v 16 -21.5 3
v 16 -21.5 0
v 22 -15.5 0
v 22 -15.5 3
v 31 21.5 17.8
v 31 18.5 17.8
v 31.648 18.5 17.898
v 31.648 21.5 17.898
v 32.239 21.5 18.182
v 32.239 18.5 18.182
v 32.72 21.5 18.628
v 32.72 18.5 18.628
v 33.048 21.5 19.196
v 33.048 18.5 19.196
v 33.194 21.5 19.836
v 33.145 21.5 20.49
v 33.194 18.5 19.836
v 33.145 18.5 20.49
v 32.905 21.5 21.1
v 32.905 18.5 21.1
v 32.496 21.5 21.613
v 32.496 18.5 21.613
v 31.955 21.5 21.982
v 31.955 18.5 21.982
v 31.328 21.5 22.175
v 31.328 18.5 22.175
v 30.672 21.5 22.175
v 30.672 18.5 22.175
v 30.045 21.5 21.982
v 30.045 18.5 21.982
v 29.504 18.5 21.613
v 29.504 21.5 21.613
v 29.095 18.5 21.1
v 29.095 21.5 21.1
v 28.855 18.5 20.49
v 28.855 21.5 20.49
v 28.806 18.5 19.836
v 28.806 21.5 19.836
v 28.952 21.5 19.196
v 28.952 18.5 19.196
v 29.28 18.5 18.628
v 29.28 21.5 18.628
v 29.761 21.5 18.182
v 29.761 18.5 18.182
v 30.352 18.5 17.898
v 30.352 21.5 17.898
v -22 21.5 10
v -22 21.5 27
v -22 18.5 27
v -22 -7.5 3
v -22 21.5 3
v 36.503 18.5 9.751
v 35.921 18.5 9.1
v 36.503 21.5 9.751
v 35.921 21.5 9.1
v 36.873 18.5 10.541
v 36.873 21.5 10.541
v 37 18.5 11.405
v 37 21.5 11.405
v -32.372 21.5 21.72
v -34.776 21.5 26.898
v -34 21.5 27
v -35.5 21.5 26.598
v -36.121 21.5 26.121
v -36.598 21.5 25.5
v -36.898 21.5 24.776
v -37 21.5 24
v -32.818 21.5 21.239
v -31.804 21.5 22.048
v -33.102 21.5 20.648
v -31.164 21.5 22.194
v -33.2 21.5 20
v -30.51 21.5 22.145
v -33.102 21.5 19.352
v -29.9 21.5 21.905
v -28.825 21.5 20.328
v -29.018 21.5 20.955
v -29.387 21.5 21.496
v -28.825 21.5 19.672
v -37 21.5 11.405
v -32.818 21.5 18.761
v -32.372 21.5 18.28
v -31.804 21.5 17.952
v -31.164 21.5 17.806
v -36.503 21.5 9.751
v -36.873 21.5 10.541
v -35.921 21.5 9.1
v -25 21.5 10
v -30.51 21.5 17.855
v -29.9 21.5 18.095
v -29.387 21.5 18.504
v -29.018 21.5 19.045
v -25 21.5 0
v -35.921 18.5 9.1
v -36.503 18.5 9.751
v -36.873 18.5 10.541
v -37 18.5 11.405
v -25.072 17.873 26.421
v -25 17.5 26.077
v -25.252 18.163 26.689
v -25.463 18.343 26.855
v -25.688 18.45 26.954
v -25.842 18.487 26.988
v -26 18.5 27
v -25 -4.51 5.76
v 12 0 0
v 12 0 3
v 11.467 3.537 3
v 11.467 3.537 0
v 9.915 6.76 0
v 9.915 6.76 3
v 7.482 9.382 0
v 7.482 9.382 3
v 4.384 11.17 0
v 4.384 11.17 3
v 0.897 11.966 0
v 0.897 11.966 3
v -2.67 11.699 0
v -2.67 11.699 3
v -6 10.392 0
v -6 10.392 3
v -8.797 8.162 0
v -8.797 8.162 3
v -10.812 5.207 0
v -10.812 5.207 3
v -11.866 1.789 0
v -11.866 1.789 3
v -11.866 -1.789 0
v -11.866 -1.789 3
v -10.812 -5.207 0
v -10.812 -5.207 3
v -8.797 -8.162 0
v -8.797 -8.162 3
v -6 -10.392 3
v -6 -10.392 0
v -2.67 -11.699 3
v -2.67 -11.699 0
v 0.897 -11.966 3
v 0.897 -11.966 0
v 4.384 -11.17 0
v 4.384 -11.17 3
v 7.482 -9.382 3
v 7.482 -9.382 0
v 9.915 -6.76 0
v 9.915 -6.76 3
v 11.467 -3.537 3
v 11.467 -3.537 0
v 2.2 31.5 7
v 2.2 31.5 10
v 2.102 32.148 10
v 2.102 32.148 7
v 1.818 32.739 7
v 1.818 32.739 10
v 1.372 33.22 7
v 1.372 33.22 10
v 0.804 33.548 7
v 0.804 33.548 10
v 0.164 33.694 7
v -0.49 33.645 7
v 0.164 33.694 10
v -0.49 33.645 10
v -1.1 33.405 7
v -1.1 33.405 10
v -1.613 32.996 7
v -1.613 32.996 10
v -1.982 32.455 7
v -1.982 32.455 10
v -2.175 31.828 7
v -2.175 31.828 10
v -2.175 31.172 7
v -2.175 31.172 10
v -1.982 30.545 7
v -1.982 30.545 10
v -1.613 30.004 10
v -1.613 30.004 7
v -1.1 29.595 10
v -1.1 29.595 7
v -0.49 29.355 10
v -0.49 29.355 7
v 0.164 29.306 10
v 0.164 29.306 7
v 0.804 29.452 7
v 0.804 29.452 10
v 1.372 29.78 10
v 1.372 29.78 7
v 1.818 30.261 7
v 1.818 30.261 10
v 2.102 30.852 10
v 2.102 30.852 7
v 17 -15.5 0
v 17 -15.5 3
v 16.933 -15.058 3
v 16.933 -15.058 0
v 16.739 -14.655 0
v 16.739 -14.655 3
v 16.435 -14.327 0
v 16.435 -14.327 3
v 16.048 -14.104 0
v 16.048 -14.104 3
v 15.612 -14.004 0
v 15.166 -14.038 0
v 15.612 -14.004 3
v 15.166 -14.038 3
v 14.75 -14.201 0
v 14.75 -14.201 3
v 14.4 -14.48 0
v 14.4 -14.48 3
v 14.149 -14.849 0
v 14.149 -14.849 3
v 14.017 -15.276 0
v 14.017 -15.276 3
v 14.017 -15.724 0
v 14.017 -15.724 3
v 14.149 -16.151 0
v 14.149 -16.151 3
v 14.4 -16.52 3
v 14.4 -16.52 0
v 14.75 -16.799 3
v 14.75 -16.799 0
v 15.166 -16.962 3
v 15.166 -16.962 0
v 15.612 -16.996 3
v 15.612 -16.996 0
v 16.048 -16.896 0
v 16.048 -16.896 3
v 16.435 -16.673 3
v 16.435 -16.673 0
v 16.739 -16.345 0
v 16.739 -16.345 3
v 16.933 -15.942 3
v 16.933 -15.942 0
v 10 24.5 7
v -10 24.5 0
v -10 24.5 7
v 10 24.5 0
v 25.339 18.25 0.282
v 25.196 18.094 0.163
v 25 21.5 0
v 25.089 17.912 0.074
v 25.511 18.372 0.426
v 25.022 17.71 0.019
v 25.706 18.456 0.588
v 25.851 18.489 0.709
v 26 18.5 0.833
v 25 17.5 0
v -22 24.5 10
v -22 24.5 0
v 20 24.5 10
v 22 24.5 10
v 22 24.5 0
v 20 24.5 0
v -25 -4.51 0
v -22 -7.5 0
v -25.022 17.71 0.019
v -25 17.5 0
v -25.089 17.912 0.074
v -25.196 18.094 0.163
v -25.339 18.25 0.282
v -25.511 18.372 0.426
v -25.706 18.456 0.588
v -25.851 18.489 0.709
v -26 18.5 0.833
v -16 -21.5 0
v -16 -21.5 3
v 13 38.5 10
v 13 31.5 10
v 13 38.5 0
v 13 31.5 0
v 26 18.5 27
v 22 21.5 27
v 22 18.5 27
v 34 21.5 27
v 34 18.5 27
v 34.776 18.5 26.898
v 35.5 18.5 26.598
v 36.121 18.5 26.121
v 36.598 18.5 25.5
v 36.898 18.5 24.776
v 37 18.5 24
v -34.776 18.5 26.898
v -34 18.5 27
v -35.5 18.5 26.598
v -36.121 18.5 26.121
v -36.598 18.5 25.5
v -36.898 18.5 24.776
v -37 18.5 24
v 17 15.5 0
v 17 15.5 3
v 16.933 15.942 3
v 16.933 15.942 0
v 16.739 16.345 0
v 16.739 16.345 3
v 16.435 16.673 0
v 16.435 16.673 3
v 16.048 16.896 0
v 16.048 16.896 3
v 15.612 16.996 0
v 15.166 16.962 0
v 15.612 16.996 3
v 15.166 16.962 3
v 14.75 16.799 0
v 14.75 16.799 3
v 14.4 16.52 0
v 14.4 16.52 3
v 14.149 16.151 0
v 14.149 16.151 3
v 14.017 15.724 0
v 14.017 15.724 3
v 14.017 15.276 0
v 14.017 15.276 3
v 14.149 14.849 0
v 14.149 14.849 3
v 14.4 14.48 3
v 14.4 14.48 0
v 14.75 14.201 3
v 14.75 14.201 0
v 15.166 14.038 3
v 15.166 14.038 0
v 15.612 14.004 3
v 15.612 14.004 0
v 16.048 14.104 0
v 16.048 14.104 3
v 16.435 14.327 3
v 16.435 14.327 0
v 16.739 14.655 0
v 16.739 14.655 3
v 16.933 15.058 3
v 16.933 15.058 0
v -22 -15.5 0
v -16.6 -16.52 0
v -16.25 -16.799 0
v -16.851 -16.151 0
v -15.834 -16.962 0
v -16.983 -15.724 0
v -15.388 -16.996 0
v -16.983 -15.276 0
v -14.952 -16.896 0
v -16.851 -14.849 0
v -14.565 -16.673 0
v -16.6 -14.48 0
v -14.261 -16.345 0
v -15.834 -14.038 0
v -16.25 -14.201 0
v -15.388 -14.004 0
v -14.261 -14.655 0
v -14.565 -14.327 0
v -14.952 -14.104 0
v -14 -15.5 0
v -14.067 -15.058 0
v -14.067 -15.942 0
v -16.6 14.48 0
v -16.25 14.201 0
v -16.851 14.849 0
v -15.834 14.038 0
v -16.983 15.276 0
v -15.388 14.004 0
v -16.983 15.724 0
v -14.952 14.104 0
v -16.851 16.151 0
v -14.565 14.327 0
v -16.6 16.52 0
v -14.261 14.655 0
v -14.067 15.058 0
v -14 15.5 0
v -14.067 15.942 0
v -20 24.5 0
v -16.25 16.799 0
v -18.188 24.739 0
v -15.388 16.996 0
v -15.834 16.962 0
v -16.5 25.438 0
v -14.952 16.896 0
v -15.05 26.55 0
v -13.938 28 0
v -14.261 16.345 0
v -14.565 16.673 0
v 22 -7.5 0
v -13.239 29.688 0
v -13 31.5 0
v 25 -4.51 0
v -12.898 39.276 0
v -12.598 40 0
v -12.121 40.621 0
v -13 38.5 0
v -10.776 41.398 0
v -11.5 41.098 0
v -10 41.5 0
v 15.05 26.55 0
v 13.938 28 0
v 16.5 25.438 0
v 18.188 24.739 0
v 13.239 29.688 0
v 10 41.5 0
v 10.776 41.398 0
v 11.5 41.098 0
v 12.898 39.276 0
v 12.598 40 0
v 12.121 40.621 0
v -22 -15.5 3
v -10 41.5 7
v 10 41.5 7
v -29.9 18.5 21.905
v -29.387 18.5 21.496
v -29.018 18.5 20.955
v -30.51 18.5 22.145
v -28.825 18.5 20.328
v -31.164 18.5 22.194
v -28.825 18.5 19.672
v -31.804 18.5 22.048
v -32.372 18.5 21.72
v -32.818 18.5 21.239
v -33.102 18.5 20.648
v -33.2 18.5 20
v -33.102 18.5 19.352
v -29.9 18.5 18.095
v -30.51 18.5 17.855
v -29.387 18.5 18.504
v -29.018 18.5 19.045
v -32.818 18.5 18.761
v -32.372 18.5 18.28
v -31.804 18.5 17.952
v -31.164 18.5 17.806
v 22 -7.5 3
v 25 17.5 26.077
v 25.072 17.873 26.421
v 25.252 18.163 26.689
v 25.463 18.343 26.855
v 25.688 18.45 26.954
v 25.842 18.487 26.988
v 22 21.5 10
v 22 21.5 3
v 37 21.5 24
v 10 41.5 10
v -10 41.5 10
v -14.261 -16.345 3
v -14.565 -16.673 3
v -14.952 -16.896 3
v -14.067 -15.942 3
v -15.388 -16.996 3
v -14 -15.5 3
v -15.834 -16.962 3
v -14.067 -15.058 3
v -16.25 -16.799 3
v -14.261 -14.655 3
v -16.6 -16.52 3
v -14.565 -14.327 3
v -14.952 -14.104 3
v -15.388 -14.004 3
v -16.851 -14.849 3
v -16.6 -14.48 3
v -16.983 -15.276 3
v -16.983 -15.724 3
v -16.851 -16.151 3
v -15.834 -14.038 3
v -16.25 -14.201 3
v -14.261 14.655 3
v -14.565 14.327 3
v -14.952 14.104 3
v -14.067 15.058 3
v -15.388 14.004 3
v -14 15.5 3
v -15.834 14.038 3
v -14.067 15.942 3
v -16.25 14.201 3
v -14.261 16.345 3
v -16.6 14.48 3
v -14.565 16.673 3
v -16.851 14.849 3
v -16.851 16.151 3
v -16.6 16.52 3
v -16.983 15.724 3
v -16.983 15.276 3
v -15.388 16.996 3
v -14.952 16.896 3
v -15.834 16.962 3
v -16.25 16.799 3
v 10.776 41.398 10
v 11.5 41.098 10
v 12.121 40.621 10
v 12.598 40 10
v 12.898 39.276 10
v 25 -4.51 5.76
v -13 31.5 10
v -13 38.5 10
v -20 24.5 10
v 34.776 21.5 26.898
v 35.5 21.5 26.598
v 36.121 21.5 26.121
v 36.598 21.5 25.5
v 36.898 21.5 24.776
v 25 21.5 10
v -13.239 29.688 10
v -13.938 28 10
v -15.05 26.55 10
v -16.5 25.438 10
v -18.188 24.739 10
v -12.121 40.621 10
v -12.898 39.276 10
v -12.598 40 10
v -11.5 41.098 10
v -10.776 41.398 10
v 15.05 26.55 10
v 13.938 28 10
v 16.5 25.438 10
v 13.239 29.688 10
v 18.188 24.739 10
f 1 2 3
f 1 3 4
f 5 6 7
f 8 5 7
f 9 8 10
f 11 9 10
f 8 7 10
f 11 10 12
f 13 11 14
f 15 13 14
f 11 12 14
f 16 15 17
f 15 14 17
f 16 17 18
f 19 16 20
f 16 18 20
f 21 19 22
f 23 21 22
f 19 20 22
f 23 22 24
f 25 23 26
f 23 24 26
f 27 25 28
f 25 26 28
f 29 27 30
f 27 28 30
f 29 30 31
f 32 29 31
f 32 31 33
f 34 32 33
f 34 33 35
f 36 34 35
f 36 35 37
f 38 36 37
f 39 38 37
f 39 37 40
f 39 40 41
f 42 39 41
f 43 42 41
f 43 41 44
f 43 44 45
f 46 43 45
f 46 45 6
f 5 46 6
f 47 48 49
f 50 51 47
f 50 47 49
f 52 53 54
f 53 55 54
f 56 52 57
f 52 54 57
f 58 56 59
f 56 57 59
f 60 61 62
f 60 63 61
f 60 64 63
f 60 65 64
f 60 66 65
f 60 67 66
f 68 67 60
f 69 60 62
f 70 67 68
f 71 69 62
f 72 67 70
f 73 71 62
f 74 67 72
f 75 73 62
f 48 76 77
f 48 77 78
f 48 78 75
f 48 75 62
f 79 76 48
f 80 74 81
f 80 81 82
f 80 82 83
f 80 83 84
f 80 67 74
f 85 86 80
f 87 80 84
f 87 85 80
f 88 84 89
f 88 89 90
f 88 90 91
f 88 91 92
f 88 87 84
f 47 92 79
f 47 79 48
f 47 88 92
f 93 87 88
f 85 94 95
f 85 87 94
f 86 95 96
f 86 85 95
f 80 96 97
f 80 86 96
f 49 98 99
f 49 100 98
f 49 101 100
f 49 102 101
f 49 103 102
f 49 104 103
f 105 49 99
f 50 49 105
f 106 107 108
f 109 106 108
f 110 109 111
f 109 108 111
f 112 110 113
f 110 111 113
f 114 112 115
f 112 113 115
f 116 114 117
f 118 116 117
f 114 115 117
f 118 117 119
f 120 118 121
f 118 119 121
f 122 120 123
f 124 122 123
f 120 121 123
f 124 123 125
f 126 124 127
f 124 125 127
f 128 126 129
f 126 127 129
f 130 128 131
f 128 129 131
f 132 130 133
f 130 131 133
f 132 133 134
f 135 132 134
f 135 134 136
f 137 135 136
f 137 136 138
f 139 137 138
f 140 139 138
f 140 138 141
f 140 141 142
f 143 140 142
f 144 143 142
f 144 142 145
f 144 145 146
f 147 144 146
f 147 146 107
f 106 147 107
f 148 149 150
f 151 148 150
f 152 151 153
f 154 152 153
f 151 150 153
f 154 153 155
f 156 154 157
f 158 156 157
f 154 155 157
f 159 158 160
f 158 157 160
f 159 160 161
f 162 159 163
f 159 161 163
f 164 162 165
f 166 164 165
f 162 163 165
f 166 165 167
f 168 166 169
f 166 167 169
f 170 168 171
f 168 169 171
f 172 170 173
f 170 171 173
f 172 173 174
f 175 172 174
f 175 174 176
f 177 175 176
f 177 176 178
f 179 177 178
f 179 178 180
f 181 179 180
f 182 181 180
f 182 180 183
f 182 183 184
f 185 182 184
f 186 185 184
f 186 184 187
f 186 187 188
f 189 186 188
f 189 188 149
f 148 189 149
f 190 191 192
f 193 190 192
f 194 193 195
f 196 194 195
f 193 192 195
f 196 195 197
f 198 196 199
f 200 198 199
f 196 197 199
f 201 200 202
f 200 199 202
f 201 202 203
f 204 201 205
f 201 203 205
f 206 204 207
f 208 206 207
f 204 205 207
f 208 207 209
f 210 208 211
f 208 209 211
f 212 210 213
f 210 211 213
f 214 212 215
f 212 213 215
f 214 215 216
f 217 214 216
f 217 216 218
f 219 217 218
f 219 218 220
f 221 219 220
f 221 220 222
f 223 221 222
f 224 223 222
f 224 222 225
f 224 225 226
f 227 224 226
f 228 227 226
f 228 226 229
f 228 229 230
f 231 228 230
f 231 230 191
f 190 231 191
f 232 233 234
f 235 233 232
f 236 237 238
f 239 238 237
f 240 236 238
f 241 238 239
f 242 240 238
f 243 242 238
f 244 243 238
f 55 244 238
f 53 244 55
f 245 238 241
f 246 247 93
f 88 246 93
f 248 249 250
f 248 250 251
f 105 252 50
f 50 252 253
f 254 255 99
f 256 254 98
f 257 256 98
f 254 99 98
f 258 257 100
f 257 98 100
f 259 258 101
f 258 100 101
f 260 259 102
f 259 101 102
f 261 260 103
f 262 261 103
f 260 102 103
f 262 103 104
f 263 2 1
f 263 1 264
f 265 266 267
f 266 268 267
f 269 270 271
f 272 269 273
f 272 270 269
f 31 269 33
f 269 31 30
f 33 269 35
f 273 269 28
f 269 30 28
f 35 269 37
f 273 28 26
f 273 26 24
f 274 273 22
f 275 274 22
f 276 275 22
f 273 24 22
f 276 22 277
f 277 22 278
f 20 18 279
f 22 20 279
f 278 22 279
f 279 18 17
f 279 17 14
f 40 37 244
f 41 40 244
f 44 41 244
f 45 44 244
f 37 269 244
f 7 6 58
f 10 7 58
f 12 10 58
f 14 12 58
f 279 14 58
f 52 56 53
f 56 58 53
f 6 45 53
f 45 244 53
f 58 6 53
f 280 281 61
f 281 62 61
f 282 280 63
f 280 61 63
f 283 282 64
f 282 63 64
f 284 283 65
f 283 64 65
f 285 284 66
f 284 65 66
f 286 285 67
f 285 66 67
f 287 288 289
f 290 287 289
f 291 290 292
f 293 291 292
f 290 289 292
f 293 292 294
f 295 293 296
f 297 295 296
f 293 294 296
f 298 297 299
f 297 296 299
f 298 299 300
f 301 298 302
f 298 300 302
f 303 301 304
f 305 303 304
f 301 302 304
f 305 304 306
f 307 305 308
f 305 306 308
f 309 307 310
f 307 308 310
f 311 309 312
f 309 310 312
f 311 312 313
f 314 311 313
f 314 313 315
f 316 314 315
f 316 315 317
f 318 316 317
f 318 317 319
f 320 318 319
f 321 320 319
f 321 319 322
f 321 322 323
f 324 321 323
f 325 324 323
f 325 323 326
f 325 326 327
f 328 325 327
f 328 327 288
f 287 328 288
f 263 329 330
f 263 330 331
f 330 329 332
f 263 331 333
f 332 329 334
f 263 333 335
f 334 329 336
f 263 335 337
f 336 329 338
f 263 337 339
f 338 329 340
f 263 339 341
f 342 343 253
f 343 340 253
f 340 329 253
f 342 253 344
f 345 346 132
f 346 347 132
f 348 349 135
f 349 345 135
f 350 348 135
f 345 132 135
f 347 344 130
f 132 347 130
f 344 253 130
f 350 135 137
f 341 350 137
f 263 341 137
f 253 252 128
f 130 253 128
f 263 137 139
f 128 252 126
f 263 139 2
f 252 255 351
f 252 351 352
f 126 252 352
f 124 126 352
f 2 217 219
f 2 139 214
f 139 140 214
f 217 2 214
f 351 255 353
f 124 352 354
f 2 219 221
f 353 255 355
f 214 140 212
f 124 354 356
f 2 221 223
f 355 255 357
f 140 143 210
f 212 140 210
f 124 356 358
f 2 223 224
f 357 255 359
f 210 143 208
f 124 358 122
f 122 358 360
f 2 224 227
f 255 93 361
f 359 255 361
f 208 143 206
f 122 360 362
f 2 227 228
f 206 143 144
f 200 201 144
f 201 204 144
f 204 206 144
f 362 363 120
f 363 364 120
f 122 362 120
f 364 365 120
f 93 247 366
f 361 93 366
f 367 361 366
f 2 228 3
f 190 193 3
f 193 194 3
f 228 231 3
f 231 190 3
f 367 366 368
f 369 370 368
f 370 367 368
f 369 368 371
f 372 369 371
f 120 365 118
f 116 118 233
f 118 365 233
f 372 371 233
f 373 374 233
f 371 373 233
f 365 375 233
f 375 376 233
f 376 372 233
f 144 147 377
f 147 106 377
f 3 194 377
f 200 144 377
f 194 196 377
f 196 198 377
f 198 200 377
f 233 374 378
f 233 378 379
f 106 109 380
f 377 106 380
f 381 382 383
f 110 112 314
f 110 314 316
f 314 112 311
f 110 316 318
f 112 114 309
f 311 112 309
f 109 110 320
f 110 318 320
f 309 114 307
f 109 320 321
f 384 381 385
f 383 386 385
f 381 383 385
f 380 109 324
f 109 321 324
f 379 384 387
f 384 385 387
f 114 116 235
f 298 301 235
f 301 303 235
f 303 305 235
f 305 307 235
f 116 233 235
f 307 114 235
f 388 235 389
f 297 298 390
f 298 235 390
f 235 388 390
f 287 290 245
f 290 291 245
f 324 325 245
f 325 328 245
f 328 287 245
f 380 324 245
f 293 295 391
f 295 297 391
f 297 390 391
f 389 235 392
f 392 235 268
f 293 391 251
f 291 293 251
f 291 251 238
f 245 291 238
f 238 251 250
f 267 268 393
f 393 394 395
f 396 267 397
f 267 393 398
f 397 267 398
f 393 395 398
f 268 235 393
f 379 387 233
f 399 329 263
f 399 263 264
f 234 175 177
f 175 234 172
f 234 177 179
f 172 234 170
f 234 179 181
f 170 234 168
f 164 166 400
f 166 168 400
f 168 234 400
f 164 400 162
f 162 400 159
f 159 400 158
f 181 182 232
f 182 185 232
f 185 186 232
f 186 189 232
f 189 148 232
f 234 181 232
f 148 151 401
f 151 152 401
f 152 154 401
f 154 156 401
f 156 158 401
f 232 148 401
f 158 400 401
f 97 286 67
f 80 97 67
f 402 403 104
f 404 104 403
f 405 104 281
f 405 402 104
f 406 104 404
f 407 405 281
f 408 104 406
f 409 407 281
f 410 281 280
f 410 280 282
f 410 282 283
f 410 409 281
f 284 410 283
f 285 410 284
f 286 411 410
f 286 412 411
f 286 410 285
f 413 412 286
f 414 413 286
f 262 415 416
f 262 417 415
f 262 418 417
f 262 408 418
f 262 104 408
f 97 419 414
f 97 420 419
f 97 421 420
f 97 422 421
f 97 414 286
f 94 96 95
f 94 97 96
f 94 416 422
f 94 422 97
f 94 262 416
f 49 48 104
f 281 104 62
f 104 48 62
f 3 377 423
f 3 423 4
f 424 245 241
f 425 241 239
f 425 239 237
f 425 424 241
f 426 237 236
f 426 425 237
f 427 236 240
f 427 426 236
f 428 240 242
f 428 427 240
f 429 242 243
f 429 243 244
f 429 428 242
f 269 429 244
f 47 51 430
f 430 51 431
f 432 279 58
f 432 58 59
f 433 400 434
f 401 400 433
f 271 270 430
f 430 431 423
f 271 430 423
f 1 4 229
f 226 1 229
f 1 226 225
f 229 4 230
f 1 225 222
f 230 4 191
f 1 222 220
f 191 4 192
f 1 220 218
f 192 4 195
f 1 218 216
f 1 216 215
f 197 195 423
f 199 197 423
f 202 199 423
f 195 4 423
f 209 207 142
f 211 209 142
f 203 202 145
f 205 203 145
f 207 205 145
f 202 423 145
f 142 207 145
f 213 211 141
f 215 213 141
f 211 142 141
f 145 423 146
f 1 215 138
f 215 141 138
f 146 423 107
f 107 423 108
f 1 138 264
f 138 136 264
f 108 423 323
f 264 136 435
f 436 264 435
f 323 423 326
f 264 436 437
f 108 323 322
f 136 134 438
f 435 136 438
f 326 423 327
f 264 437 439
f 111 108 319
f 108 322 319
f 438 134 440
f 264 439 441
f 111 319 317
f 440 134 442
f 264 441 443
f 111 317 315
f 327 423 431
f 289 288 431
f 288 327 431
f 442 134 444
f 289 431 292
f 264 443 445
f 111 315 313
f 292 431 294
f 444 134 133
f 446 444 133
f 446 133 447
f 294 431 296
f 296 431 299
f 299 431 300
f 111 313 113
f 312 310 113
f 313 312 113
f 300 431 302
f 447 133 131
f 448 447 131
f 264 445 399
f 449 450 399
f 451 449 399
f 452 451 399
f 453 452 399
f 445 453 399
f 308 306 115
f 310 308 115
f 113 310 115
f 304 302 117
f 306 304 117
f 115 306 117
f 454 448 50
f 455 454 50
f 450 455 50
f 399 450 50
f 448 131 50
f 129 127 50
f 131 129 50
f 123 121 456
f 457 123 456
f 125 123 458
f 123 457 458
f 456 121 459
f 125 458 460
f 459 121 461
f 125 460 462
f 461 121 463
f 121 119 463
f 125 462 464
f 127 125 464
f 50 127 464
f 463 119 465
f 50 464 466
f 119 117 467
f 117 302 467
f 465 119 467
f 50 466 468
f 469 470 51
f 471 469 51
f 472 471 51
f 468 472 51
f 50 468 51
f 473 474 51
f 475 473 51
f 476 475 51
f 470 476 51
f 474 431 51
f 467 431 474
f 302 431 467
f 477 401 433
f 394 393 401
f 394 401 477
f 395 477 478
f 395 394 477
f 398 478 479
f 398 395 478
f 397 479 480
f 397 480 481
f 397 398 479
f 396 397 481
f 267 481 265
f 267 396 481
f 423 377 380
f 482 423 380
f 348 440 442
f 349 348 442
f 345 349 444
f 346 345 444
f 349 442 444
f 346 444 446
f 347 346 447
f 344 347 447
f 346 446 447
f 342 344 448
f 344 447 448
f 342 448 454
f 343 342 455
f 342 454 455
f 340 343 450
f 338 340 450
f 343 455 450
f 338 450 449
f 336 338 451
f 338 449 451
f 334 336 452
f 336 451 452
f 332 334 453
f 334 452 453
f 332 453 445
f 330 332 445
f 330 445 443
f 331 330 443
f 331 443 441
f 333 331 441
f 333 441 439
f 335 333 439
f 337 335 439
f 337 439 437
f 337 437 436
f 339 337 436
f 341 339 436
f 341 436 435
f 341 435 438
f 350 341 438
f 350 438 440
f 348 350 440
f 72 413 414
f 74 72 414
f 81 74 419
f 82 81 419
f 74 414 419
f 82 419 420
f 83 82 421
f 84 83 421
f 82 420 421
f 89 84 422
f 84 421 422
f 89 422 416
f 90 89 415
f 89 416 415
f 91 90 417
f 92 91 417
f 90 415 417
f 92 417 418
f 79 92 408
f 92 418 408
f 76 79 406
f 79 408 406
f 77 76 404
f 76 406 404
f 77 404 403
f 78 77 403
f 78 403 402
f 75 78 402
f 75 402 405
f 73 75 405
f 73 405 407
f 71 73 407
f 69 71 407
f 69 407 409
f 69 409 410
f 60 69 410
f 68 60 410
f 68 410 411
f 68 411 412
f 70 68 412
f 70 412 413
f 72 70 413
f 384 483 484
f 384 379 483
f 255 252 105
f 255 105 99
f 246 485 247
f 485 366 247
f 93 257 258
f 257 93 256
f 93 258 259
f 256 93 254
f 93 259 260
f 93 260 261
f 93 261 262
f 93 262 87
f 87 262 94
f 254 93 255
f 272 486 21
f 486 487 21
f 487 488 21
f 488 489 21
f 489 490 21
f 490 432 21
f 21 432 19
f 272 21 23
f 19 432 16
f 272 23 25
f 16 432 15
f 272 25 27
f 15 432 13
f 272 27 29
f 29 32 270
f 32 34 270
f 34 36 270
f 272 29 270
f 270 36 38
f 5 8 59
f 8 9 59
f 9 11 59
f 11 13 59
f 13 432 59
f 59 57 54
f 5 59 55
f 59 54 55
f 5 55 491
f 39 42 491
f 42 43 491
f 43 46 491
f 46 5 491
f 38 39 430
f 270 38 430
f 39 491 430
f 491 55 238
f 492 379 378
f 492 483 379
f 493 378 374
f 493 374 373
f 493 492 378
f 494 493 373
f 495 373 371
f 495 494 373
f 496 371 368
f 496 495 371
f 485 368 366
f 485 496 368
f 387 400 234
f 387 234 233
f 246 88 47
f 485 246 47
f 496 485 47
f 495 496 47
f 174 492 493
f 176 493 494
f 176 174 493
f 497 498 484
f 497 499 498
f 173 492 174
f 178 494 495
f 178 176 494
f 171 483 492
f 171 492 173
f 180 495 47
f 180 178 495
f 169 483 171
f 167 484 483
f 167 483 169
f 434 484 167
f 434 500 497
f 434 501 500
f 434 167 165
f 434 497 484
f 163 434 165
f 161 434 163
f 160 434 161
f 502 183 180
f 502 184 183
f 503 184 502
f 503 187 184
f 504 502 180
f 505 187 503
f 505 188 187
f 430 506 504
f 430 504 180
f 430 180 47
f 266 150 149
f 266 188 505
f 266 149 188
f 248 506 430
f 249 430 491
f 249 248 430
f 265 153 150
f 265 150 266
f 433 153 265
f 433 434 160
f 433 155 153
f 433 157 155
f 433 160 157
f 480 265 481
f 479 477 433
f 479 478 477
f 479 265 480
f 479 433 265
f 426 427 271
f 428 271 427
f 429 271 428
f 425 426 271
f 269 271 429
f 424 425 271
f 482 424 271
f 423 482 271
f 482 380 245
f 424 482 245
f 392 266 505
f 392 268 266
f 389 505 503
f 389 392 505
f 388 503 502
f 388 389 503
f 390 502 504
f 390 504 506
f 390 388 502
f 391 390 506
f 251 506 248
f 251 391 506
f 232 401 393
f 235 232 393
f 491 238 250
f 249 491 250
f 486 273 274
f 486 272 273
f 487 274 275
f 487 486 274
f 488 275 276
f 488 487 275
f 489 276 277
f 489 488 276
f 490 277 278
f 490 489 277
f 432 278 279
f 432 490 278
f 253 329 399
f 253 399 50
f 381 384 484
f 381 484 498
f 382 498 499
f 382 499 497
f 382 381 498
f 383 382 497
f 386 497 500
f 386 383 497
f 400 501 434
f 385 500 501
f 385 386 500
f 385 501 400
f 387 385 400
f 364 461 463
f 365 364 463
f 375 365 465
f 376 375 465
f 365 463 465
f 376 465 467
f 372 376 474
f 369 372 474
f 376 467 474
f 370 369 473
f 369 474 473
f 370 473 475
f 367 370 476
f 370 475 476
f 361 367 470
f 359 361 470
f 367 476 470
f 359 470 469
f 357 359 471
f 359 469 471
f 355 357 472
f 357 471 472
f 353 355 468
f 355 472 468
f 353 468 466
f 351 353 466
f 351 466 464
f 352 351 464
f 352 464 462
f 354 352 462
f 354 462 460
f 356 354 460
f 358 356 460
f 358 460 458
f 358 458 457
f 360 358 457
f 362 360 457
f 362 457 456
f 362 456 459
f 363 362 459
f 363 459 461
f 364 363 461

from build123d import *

# Parameters (mm, degrees)
BOSS_EXTRUDE1_DEPTH     = 3
BOSS_EXTRUDE2_DEPTH     = 27
BOSS_EXTRUDE2_2_DEPTH   = 27
BOSS_EXTRUDE3_DEPTH     = 10
SKETCH4_W               = 26
SKETCH4_H               = 17
BOSS_EXTRUDE4_DEPTH     = 7
CUT_EXTRUDE1_DEPTH      = 80.342611502
SKETCH6_R               = 2.2
CUT_EXTRUDE2_DEPTH      = 61.811183182
SKETCH7_W               = 20
SKETCH7_H               = 7
CUT_EXTRUDE3_DEPTH      = 17
SKETCH8_R               = 12
SKETCH8_R_2             = 1.5
CUT_EXTRUDE4_DEPTH      = 61.557823607
SKETCH9_R               = 2.2
CUT_EXTRUDE5_DEPTH      = 59.139917441
FILLET1_R               = 7
FILLET2_R               = 3
CHAMFER1_SIZE           = 6
CUT_EXTRUDE6_DEPTH      = 61.557823607
CUT_EXTRUDE6_DEPTH_BACK = 61.557823607
FILLET3_R               = 1


with BuildPart() as part:
    # Sketch1 → Boss-Extrude1 (new body)
    with BuildSketch(Plane.XY):
        Polygon((-13, 21.5), (-13, 41.5), (13, 41.5), (13, 21.5), (22, 21.5), (22, -21.5), (-22, -21.5), (-22, 21.5), align=None)
    extrude(amount=BOSS_EXTRUDE1_DEPTH)



with BuildPart() as body_2:
    # Sketch2 → Boss-Extrude2 (new body)
    with BuildSketch(Plane(origin=(0, 0, 0), x_dir=(-1, 0, 0), z_dir=(0, 0, -1))):
        Polygon((37, 21.5), (22, 21.5), (22, -7.5), (25, -7.5), (25, 18.5), (37, 18.5), align=None)
    extrude(amount=-BOSS_EXTRUDE2_DEPTH)


with BuildPart() as body_3:
    # Sketch2 → Boss-Extrude2 2 (new body)
    with BuildSketch(Plane(origin=(0, 0, 0), x_dir=(-1, 0, 0), z_dir=(0, 0, -1))):
        Polygon((-37, 18.5), (-37, 21.5), (-22, 21.5), (-22, -7.5), (-25, -7.5), (-25, 18.5), align=None)
    extrude(amount=-BOSS_EXTRUDE2_2_DEPTH)


with BuildPart() as part_1:
    add(part.part)

    add(body_2.part)  # Boss-Extrude3 merges body 2

    add(body_3.part)  # Boss-Extrude3 merges body 3
    # Sketch3 → Boss-Extrude3 (add)
    with BuildSketch(Plane(origin=(0, 0, 0), x_dir=(-1, 0, 0), z_dir=(0, 0, -1))):
        Polygon((-25, 21.5), (-22, 24.5), (22, 24.5), (25, 21.5), align=None)
    extrude(amount=-BOSS_EXTRUDE3_DEPTH)

    # Sketch4 → Boss-Extrude4 (add)
    with BuildSketch(Plane.XY.offset(3)):
        with Locations((0, 33)):
            Rectangle(SKETCH4_W, SKETCH4_H)
    extrude(amount=BOSS_EXTRUDE4_DEPTH)

    # Sketch5 → Cut-Extrude1 (cut, through all)
    with BuildSketch(Plane(origin=(25, 0, 0), x_dir=(0, 0, -1), z_dir=(1, 0, 0))):
        Polygon((-27, 18.5), (-3, -7.5), (-27, -7.5), align=None)
    extrude(amount=-CUT_EXTRUDE1_DEPTH, mode=Mode.SUBTRACT)

    # Sketch6 → Cut-Extrude2 (cut, through all)
    with BuildSketch(Plane.XZ.offset(-18.5)):
        with Locations(Location((31, 20, 0), (0, 0, 270))):
            Circle(SKETCH6_R)
        with Locations(Location((-31, 20, 0), (0, 0, 180))):
            Circle(SKETCH6_R)
        Polygon((25, 0), (37, 10), (37, 0), align=None)
        Polygon((-37, 0), (-25, 0), (-37, 10), align=None)
    extrude(amount=-CUT_EXTRUDE2_DEPTH, mode=Mode.SUBTRACT)

    # Sketch7 → Cut-Extrude3 (cut)
    with BuildSketch(Plane(origin=(0, 41.5, 0), x_dir=(1, 0, 0), z_dir=(0, 1, 0))):
        with Locations((0, -3.5)):
            Rectangle(SKETCH7_W, SKETCH7_H)
    extrude(amount=-CUT_EXTRUDE3_DEPTH, mode=Mode.SUBTRACT)

    # Sketch8 → Cut-Extrude4 (cut, through all)
    with BuildSketch(Plane.XY.offset(3)):
        Circle(SKETCH8_R)
        with Locations((-15.5, 15.5)):
            Circle(SKETCH8_R_2)
        with Locations((15.5, 15.5)):
            Circle(SKETCH8_R_2)
        with Locations((15.5, -15.5)):
            Circle(SKETCH8_R_2)
        with Locations((-15.5, -15.5)):
            Circle(SKETCH8_R_2)
    extrude(amount=-CUT_EXTRUDE4_DEPTH, mode=Mode.SUBTRACT)

    # Sketch9 → Cut-Extrude5 (cut, through all)
    with BuildSketch(Plane.XY.offset(10)):
        with Locations((0, 31.5)):
            Circle(SKETCH9_R)
    extrude(amount=-CUT_EXTRUDE5_DEPTH, mode=Mode.SUBTRACT)

    # Fillet1
    fillet1_edges = [part_1.edges().sort_by_distance(p)[0] for p in [
        (13, 24.5, 5),
        (-13, 24.5, 5),
    ]]
    fillet(fillet1_edges, radius=FILLET1_R)

    # Fillet2
    fillet2_edges = [part_1.edges().sort_by_distance(p)[0] for p in [
        (13, 41.5, 5),
        (-13, 41.5, 5),
        (-37, 20, 10),
        (37, 20, 10),
        (-37, 20, 27),
        (37, 20, 27),
    ]]
    fillet(fillet2_edges, radius=FILLET2_R)

    # Chamfer1
    chamfer1_edges = [part_1.edges().sort_by_distance(p)[0] for p in [
        (22, -21.5, 1.5),
        (-22, -21.5, 1.5),
    ]]
    chamfer(chamfer1_edges, length=CHAMFER1_SIZE)

    # Sketch10 → Cut-Extrude6 (cut, two sides: drawn at the far end of the back side and taken through both)
    with BuildSketch(Plane.XY.offset(3).offset(-CUT_EXTRUDE6_DEPTH_BACK)):
        Polygon((22, -7.5), (25, -4.510011911), (25, -7.5), align=None)
        Polygon((-22, -7.5), (-25, -7.5), (-25, -4.510005014), align=None)
    extrude(amount=CUT_EXTRUDE6_DEPTH + CUT_EXTRUDE6_DEPTH_BACK, mode=Mode.SUBTRACT)

    # Fillet3
    fillet3_edges = [part_1.edges().sort_by_distance(p)[0] for p in [
        (-25, 18.5, 13.5),
        (25, 18.5, 13.5),
    ]]
    fillet(fillet3_edges, radius=FILLET3_R)


solid = part_1.part
